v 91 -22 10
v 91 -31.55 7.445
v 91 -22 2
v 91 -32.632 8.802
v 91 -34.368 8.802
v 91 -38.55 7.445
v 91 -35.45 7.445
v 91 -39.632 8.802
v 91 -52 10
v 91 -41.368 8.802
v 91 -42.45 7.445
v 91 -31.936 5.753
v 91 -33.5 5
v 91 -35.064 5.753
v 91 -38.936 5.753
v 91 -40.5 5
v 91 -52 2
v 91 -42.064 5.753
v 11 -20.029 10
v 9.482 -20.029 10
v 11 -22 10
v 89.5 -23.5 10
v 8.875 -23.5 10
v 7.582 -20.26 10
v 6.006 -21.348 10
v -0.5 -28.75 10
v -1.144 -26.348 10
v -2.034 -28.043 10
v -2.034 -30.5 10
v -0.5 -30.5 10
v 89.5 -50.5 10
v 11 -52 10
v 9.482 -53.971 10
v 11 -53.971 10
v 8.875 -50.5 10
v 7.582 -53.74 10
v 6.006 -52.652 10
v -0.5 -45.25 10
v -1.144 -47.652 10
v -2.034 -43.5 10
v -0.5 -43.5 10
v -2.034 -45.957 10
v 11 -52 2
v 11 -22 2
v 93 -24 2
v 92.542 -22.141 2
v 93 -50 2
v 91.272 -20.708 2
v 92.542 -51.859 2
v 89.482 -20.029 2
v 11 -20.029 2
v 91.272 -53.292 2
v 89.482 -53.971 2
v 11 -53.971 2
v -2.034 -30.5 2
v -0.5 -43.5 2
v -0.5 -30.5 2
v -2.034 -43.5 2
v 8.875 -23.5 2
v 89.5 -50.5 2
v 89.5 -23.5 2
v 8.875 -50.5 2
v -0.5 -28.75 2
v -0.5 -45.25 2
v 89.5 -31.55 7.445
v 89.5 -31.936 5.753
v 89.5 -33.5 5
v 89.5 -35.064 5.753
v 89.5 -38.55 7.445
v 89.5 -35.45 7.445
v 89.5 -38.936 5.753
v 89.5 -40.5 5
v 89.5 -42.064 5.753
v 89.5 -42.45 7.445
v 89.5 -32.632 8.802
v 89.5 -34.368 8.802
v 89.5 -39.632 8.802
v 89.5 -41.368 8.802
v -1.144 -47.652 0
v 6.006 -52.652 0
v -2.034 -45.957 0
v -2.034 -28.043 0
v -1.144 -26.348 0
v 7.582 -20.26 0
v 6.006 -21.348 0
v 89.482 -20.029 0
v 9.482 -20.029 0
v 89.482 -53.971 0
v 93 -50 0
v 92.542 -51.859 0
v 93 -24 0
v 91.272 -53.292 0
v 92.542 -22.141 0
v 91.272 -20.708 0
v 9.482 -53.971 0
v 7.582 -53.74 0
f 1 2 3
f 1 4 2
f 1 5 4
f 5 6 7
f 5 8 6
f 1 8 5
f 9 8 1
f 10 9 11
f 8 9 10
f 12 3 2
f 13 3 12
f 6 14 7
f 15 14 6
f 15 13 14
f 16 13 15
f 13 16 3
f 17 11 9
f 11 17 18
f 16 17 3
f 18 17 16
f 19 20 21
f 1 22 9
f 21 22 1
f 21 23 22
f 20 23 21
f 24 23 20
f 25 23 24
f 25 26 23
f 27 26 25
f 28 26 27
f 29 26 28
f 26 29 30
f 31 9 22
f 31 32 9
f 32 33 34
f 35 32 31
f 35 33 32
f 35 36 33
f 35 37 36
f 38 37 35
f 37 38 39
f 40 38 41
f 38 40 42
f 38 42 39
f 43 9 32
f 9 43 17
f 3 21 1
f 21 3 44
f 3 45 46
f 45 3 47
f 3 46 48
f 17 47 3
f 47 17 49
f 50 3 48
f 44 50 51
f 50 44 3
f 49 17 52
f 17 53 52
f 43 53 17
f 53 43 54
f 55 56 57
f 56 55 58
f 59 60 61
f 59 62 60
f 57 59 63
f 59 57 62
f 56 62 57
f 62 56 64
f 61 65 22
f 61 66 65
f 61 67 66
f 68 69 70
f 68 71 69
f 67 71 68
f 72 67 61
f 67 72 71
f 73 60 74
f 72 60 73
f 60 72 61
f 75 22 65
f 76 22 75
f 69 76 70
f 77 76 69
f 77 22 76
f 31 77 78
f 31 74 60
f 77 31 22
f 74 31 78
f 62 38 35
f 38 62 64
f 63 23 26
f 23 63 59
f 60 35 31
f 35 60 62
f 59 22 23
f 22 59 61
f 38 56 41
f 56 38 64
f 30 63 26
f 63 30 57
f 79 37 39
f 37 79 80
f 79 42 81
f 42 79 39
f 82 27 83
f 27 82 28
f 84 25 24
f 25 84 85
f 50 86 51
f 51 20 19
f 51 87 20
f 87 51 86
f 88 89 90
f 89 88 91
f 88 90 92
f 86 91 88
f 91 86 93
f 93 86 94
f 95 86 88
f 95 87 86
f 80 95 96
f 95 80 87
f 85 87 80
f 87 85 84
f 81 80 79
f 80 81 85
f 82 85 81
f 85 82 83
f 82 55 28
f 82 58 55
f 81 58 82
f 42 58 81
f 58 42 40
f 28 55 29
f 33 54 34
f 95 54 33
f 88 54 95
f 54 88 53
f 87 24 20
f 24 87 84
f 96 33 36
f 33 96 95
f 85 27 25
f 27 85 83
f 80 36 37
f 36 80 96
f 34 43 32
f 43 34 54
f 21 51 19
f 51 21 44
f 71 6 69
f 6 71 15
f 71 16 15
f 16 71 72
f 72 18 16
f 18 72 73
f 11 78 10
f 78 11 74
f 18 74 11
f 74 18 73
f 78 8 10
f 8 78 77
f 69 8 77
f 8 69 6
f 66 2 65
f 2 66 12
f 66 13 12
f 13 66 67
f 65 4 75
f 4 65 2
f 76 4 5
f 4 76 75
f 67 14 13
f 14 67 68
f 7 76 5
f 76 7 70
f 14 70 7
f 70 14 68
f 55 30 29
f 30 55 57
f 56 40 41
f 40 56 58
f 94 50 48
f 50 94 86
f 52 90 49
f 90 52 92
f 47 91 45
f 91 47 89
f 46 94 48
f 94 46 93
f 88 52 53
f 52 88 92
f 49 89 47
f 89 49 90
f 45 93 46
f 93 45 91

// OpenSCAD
// file: icestick.scad
pcb_l = 89;
pcb_w = 26;
pcb_cut_w = 5;
pcb_cut_l = 9;

module icestick() {

  module pin10() {
   color("white"){
     difference(){
       cube([26.5,3,.125]);
       translate([0.125,0.125,-.25]){
         cube([26.25,2.75,.75]);
       }
     }
   }
   for (i = [0:9]) {
     translate([0.55+2.54*i,.23,0]){
      color("DodgerBlue"){
        cube([2.54,2.54,2.54]);
      }
      color("Gainsboro"){
        translate([.87,.87,-3]){
          cube([.8,.8,11]);
        }
      }
     }
   }
  }

  module leds() {
   module led() {
     cube([1,1.25,.25],center=true);
   }
   led();
   translate([2.5,0,0]){led();}
   translate([-2.5,0,0]){led();}
   translate([0,5,0]){led();}
   translate([0,-5,0]){led();}
  }

  // PCB
  color("DarkGreen"){
    linear_extrude(2){
      polygon(points=[[0,pcb_cut_w],[pcb_cut_l,0],[pcb_l,0],[pcb_l,pcb_w],[pcb_cut_l,pcb_w],[0,pcb_w-pcb_cut_w]]);
    }
  }

  // USB
  color("Gainsboro"){
    translate([-15,7,-1]){
      cube([19,12,4.5]);
    }
  }

  // ICs
  color("DimGray"){
    translate([40,3,2]){
      cube([20,20,1]);
    }
    translate([10,7,2]){
      cube([10, 10,.5]);
    }
    translate([18,20,2]){
      cube([4, 5,.5]);
    }
    translate([26,10,2]){
      cube([5, 4,.5]);
    }
    translate([24,1,2]){
      cube([4.5,7,.5]);
    }
  }

  // IR
  translate([86,8,2]){
    color("DimGray"){
      cube([3,10,4]);
    }
    color("DarkSlateGray"){
      translate([3,1.5,2]){
        sphere(1.5);
      }
      translate([3,8.5,2]){
        sphere(1.5);
      }
    }
  }

  // LEDs
  color("GreenYellow"){
    translate([71,13,2]){
      leds();
    }
  }

  // Pin rows
  translate([62,.5,2]){
    pin10();
    translate([0,22,0]){
      pin10();
    }
  }

  // J2
  color("DimGray"){
    translate([76,5,2]){
      difference(){
        cube([6,16,8]);
        for (i = [0:1]) {
          for (j = [0:5]) {
            color("Gainsboro"){
              translate([1.25+i*3,1+j*2.6,2]){
                cube([1,1,11]);
              }
            }
          }
        }
      }
    }
  }

}
// main file
include <icestick.scad>

//$fn=144;

module layout(c,h) {
  linear_extrude(h){
    polygon(points=[
      [-c,pcb_cut_w-c/2],
      [pcb_cut_l-c/4,-c],
      [pcb_l+c,-c],
      [pcb_l+c,pcb_w+c],
      [pcb_cut_l-c/4,pcb_w+c],
      [-c,pcb_w-pcb_cut_w+c/2]
    ]);
  }
}

module hull_layout(c,h) {
  linear_extrude(h){
  hull() {
    translate([1.85,pcb_cut_w,0]){
      circle(c);
    }
    translate([pcb_cut_l,0,0]){
      circle(c);
    }
    translate([pcb_l,0,0]){
      circle(c);
    }
    translate([pcb_l,pcb_w,0]){
      circle(c);
    }
    translate([pcb_cut_l,pcb_w,0]){
      circle(c);
    }
    translate([1.85,pcb_w-pcb_cut_w,0]){
      circle(c);
    }
  }}
}

module wall(o,i,h) {
  difference(){
    layout(o,h);
    translate([0,0,-h/2]){
      layout(i,2*h);
    }
  }
}

module hull_wall(o,i,h) {
  difference(){
    hull_layout(o,h);
    translate([0,0,-h/2]){
      hull_layout(i,2*h);
    }
  }
}

module ir_hole(z) {
  translate([88,9.5,z]){
    rotate([0,90,0]){
      //hull() {
        cylinder(r=2,h=8);
        translate([0,7,0]){
          cylinder(r=2,h=8);
        }
      //}
    }
  }
}

module bottom() {
union(){
  hull_layout(4,2);
  difference(){
    union(){
    translate([0,0,2]){
      wall(2,.5,8);
    }
      difference(){
    difference(){
      hull_layout(4,10);
      layout(.5,12);
    }
    translate([pcb_cut_l+2,-20,-10]){
      cube([100,50,50]);
    }
  }
  }
    union() {
      ir_hole(7);
      translate([-3.5,6.5,2]){
        cube([4.5,13,10]);
      }
    }
  }

}
}

module led_seps() {
  translate([71,13,-1]){
    translate([0,2.5,0]){cube([8,2,6],true);}
    translate([0,-2.5,0]){cube([8,2,6],true);}
    translate([1.25,0,0]){cube([.7,12.5,6],true);}
    translate([-1.25,0,0]){cube([.7,12.5,6],true);}
  }
}

module led_holes() {
  module led() {
    cylinder(r=.85,h=4);
  }
  translate([71,13,-1]){
    led();
    translate([2.5,0,0]){led();}
    translate([-2.5,0,0]){led();}
    translate([0,5,0]){led();}
    translate([0,-5,0]){led();}
  }
}

module top() {
union(){
  difference() {
    hull_layout(4,2);
    union() {
      // Pin rows
      translate([62,.5,-1]){
        cube([26.5,3,4]);
        translate([0,22,0]){
          cube([26.5,3,4]);
        }
      }
      // J2
      translate([76,5,-4]){
        difference(){
          cube([6,16,16]);
        }
      }
      // LEDs
      led_holes();
      translate([5.5,7,1.25]){
        linear_extrude(1.5){
         text("elide",12,"DejaVu Sans Mono");
        }
      }
    }
  }
  translate([0,0,-8]){
    difference() {
      difference(){
        hull_layout(4,8);
        layout(2,8);
      }
      union(){
        // IR
        ir_hole(5);
        translate([-pcb_cut_l+6,-20,-10]){
          cube([pcb_cut_l+5,50,50]);
        }
        translate([49,0,-20]){
          rotate([90,0,0]){
            cylinder(d=50,h=100,center=true);
          }
        }
      }
    }
  }
  led_seps();
  difference(){
    translate([0,0,-3]){
      layout(.5,3);
      translate([-2.125,6.5,0]){
        cube([10,13,3]);
      }
    }
    translate([7,-20,-10]){
      cube([100,50,50]);
    }
  }
}
}

/*
color("red"){
  translate([0,0,-3]){
    bottom();
  }
  translate([0,0,27]){
    top();
  }
}

icestick();
*/

translate([0,-50,]){
  bottom();
}

/*
rotate([180,0,0]){
  translate([0,65,-2]){
    top();
  }
}
*/
